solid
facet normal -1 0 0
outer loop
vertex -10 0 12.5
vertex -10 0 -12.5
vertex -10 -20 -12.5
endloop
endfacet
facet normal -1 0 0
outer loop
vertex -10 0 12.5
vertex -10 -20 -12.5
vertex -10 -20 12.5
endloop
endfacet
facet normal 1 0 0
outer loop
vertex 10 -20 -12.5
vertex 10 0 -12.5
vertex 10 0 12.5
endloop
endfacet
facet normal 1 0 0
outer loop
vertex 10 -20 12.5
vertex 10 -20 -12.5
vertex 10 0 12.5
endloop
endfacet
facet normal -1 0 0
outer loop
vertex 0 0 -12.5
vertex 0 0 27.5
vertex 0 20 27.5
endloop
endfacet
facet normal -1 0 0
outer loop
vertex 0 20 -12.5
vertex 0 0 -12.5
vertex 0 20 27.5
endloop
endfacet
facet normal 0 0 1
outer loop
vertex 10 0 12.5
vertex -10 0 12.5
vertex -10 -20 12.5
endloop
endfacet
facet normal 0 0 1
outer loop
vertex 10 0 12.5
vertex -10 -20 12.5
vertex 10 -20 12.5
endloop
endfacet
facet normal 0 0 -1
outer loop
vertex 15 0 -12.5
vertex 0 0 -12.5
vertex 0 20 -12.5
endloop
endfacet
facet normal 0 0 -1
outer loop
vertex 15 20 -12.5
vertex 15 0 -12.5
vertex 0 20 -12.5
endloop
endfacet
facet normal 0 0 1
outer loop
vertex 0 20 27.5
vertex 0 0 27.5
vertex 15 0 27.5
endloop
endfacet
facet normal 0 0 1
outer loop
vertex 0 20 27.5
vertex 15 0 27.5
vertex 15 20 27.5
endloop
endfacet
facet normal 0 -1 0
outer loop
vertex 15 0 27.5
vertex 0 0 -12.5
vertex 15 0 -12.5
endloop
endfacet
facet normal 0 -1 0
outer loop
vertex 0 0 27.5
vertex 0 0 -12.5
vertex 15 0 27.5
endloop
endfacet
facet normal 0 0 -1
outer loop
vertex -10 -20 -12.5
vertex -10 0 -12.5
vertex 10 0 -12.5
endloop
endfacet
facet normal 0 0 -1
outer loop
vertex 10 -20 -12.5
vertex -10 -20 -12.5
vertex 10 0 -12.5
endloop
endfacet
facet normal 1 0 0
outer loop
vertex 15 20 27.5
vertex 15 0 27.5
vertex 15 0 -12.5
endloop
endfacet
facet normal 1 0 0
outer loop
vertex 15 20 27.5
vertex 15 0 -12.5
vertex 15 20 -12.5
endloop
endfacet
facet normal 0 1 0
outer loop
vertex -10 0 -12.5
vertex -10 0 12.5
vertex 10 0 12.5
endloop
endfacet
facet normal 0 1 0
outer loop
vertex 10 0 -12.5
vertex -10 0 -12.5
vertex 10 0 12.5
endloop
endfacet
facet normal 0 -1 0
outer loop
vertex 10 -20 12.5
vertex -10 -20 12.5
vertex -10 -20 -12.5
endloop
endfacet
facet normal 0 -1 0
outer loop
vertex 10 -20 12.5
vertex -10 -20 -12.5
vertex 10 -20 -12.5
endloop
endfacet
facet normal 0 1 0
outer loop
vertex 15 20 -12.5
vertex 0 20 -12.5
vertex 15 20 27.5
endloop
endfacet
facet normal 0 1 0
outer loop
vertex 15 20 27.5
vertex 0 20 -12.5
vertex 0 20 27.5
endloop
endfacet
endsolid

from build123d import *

# Parameters (mm, degrees)
F0_W     = 20
F0_H     = 25
F1_DEPTH = 20
F2_W     = 20
F2_H     = 40
F3_DEPTH = 15


with BuildPart() as f1:
    # F0 (on Front) → F1 (new body)
    with BuildSketch(Plane.XZ):
        Rectangle(F0_W, F0_H)
    extrude(amount=F1_DEPTH)


with BuildPart() as f3:
    # F2 (on Right) → F3 (new body)
    with BuildSketch(Plane.YZ):
        with Locations((10, 7.5)):
            Rectangle(F2_W, F2_H)
    extrude(amount=F3_DEPTH)


solid = Compound([f1.part, f3.part])
